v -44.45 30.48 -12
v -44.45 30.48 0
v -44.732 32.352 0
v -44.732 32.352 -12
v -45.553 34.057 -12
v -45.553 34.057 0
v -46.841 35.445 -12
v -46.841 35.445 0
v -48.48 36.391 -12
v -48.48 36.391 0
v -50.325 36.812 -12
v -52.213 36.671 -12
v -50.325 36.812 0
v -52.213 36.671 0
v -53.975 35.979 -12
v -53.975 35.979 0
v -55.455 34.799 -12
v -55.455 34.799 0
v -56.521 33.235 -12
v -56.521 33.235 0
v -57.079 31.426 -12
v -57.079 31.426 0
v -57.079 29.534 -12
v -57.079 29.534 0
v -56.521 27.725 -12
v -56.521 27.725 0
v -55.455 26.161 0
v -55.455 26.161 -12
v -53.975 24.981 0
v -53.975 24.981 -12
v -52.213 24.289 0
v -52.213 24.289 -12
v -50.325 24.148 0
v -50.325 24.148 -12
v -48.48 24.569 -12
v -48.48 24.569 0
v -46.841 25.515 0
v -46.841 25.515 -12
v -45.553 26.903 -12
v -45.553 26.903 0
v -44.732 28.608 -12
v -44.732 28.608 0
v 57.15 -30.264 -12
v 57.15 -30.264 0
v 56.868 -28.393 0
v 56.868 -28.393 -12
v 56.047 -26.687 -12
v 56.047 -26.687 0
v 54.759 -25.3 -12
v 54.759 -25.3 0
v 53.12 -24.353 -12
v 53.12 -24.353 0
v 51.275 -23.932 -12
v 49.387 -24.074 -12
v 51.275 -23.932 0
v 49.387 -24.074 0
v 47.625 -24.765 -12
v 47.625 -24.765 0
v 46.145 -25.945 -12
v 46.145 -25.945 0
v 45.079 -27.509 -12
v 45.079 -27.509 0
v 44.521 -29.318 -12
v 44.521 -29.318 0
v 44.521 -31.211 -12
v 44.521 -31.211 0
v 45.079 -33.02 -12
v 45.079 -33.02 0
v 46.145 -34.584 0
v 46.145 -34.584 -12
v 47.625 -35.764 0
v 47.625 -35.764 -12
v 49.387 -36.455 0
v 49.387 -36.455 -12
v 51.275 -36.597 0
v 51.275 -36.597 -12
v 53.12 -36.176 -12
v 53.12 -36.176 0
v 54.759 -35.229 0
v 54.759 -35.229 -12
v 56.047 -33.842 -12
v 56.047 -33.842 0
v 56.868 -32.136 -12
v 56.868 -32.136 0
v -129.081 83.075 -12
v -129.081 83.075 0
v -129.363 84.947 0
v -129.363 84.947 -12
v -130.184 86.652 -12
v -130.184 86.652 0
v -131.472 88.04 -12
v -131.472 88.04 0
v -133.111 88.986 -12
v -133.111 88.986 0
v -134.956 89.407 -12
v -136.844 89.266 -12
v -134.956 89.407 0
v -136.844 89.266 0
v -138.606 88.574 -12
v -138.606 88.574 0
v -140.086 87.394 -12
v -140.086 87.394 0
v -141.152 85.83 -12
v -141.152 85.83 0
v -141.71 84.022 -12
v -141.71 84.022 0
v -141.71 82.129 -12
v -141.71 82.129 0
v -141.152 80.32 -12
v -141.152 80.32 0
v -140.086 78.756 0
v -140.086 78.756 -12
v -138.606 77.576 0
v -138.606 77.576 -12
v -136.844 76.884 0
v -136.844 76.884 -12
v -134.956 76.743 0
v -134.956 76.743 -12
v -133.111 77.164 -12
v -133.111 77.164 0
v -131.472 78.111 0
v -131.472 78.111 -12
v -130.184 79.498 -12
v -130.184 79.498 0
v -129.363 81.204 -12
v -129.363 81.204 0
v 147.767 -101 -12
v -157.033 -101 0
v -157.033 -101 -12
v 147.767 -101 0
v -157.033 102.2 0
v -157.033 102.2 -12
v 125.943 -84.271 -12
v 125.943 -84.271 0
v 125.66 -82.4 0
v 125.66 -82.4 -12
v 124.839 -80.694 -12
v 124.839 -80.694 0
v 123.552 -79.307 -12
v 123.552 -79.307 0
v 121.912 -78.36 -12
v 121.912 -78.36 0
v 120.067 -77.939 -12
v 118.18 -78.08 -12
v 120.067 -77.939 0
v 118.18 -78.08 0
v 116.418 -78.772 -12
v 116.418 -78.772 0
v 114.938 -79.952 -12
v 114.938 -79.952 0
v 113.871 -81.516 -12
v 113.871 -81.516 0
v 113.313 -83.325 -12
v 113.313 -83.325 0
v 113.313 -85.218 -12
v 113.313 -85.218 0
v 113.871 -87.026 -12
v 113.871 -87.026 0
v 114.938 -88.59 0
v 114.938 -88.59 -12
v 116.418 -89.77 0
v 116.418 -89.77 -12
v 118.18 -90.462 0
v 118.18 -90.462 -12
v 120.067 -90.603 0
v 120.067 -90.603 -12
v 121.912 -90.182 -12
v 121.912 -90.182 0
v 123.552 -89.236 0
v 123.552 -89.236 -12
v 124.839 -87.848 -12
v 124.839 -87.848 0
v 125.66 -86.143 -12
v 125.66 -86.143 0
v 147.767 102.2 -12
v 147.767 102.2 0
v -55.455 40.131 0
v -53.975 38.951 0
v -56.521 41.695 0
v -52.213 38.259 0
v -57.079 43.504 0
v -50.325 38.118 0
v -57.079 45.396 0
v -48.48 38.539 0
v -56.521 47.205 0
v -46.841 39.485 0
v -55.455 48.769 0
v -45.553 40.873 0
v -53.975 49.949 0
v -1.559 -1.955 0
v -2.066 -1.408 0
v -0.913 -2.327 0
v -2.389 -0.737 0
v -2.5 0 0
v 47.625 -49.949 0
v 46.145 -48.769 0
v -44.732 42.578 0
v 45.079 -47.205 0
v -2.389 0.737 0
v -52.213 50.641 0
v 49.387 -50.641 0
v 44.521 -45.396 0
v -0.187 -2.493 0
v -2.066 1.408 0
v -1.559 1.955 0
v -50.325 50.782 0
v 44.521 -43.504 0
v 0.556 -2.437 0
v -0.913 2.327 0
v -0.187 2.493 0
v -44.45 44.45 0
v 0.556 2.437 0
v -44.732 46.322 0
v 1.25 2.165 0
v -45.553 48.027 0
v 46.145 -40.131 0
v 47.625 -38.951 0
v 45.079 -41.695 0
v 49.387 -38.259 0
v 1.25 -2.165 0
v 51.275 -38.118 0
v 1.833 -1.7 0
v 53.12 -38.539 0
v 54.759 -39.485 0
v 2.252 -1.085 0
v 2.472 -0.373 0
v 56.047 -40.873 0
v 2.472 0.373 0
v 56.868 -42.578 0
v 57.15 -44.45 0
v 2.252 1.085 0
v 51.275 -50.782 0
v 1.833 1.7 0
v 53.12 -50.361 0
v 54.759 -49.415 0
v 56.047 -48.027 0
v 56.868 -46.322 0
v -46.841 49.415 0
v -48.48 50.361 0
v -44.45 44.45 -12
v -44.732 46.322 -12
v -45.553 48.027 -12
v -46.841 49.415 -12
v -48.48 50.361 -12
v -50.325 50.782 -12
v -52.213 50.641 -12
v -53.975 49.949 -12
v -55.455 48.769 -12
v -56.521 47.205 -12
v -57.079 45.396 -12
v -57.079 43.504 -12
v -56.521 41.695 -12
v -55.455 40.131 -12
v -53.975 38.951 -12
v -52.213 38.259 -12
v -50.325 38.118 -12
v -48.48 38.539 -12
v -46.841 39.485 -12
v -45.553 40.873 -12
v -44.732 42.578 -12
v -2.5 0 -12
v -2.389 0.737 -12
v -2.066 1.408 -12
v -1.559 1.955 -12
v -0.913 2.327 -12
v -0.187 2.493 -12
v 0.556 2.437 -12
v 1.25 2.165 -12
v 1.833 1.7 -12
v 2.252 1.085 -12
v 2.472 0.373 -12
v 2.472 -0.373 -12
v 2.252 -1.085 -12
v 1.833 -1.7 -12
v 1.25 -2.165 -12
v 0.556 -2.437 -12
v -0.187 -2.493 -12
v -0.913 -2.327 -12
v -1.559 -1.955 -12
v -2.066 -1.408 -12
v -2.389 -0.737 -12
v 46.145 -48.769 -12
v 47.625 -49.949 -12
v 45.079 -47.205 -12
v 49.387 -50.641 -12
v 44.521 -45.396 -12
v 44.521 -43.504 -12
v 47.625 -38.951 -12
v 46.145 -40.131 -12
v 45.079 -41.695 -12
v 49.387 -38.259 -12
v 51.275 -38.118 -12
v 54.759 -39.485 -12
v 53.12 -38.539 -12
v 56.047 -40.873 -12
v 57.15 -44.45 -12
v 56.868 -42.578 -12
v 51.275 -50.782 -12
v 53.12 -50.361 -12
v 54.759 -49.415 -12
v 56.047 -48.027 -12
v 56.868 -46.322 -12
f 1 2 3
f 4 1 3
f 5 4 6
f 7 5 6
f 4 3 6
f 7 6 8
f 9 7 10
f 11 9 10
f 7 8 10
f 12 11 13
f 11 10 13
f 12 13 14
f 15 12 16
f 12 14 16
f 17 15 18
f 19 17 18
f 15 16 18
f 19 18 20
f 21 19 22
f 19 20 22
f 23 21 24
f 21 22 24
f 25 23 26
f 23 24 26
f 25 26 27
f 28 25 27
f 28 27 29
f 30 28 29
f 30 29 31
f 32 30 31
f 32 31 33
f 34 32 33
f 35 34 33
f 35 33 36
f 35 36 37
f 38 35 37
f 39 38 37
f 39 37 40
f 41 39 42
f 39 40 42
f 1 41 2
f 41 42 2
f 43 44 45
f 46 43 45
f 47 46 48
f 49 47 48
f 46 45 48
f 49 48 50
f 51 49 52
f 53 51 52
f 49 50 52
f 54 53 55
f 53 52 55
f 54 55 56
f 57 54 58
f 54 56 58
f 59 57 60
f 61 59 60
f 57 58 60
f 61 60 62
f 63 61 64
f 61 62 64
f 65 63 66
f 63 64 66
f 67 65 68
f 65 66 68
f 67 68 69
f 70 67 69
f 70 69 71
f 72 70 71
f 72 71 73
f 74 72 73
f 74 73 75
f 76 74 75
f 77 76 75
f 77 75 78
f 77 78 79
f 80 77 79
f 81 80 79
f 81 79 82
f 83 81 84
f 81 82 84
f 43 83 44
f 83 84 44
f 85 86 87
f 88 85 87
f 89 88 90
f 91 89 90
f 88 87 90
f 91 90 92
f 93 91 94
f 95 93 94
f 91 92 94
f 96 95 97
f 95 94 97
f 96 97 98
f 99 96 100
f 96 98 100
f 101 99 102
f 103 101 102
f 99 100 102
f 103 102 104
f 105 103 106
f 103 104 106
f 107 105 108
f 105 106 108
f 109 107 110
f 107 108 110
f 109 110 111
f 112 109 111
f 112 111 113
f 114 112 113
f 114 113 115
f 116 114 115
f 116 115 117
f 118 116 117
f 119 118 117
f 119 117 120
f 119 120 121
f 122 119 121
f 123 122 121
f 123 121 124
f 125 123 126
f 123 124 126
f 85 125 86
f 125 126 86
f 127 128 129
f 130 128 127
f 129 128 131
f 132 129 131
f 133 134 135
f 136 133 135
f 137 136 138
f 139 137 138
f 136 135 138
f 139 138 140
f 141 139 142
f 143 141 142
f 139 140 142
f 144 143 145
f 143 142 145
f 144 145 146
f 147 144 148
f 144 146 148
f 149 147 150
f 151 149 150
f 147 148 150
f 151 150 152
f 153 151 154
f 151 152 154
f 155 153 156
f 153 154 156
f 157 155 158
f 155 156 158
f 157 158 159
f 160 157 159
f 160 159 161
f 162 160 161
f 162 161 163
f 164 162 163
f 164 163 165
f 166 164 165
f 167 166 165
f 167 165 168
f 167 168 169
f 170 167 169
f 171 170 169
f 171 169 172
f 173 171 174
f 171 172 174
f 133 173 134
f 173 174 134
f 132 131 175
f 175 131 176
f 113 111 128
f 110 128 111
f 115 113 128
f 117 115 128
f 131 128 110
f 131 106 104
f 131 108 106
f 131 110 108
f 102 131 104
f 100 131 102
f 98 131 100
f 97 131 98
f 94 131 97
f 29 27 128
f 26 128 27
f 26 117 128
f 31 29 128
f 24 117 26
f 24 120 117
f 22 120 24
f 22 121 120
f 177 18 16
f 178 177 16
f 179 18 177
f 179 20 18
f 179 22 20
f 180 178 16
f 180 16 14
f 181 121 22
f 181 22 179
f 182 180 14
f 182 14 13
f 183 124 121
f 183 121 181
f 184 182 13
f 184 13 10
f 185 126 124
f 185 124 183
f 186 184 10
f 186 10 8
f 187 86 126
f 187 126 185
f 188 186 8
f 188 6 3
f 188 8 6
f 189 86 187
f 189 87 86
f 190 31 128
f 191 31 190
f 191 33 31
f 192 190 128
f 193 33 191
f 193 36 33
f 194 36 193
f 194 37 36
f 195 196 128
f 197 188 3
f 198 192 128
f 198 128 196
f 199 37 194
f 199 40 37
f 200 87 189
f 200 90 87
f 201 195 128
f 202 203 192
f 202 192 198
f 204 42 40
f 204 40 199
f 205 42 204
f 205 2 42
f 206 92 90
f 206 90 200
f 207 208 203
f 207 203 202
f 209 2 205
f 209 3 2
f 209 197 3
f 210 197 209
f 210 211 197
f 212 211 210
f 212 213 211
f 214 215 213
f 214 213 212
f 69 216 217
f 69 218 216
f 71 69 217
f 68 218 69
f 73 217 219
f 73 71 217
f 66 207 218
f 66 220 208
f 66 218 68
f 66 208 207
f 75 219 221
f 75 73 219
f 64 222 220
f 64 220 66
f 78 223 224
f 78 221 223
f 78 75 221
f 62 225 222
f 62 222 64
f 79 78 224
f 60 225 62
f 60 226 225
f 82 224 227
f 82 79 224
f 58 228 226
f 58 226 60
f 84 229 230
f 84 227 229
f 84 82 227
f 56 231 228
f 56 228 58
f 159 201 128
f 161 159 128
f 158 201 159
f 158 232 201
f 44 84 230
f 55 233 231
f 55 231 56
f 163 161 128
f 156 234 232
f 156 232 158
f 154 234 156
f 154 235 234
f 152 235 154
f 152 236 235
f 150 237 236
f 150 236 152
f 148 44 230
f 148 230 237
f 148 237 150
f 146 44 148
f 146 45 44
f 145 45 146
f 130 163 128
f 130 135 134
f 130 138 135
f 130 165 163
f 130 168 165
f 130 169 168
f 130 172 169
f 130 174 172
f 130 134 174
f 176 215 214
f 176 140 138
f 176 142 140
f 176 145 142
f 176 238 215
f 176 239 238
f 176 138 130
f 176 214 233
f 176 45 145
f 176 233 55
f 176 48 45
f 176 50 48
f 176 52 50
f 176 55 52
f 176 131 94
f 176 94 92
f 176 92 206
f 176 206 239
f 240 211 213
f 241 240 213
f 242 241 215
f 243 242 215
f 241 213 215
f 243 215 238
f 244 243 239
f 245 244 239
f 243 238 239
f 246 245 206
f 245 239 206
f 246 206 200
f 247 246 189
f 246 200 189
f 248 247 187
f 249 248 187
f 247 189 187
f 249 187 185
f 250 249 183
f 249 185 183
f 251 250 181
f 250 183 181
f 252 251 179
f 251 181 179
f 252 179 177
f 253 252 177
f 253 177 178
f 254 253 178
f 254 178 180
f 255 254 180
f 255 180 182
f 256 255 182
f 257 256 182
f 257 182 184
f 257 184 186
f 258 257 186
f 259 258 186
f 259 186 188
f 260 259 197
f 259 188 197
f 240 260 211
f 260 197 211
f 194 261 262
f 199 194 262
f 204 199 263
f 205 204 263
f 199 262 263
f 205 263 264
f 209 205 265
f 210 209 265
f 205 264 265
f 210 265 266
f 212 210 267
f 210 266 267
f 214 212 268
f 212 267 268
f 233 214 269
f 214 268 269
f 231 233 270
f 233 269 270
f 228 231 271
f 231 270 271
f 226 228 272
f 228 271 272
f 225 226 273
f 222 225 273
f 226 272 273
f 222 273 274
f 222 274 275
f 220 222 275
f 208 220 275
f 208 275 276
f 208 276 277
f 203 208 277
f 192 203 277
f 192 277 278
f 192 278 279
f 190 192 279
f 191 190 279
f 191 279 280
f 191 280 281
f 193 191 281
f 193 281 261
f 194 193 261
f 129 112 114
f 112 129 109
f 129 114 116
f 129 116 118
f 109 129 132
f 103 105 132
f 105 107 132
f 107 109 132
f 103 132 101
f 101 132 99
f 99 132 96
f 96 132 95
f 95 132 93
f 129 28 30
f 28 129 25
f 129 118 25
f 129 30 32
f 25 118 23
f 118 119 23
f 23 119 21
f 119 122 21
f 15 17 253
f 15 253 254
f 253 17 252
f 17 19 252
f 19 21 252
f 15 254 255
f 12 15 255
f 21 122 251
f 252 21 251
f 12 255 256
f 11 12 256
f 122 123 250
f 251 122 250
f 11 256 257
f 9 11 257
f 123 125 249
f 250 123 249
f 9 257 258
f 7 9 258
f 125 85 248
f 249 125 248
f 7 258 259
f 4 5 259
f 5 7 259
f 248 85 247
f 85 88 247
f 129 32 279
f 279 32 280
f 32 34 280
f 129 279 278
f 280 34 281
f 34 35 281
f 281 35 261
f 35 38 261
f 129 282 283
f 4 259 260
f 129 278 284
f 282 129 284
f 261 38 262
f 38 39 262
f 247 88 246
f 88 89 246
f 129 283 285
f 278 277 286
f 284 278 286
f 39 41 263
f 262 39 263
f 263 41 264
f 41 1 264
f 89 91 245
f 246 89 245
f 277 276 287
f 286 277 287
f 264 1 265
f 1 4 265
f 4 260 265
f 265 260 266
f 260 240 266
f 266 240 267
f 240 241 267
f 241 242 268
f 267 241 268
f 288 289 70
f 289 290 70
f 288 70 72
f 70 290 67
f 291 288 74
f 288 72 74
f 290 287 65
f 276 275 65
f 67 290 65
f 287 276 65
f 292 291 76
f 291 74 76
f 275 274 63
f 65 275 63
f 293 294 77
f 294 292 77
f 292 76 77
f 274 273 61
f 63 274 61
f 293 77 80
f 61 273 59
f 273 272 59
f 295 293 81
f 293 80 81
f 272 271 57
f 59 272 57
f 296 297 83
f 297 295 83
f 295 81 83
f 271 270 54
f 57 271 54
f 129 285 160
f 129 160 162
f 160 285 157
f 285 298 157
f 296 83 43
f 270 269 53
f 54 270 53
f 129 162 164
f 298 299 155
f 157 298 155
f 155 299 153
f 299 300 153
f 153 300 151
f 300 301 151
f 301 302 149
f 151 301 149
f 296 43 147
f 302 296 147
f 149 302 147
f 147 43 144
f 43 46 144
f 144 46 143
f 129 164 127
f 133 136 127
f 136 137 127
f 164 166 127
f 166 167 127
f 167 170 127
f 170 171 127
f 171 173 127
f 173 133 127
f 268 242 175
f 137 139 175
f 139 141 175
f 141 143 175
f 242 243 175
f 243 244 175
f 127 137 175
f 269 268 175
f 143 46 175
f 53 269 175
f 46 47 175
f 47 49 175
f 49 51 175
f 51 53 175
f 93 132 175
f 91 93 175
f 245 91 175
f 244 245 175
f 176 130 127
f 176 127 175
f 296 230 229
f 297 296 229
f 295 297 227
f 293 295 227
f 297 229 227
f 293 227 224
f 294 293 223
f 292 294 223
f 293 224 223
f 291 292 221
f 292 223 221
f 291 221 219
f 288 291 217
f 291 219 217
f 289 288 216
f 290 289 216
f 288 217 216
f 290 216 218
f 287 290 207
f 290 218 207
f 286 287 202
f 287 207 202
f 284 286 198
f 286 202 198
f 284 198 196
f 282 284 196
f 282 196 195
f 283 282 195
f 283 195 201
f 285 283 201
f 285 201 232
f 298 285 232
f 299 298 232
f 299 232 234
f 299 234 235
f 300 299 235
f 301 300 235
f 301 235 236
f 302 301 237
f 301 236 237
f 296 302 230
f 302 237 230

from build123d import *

# Parameters (mm, degrees)
F0_W     = 304.8
F0_H     = 203.2
F0_R     = 6.35
F1_DEPTH = 12
F3_D     = 5


with BuildPart() as f1:
    # F0 (on Top) → F1 (new body)
    with BuildSketch(Plane.XY):
        with Locations((-4.632816, 0.599919)):
            Rectangle(F0_W, F0_H)
        with Locations((119.592541, -84.271215)):
            Circle(F0_R, mode=Mode.SUBTRACT)
        with Locations((50.8, -44.45)):
            Circle(F0_R, mode=Mode.SUBTRACT)
        with Locations((50.8, -30.264465)):
            Circle(F0_R, mode=Mode.SUBTRACT)
        with Locations((-50.8, 30.48)):
            Circle(F0_R, mode=Mode.SUBTRACT)
        with Locations((-50.8, 44.45)):
            Circle(F0_R, mode=Mode.SUBTRACT)
        with Locations((-135.430858, 83.075233)):
            Circle(F0_R, mode=Mode.SUBTRACT)
    extrude(amount=-F1_DEPTH)

    # F3 (through all)
    with Locations(Plane.XY):
        with Locations((0, 0)):
            Hole(F3_D / 2)


solid = f1.part
